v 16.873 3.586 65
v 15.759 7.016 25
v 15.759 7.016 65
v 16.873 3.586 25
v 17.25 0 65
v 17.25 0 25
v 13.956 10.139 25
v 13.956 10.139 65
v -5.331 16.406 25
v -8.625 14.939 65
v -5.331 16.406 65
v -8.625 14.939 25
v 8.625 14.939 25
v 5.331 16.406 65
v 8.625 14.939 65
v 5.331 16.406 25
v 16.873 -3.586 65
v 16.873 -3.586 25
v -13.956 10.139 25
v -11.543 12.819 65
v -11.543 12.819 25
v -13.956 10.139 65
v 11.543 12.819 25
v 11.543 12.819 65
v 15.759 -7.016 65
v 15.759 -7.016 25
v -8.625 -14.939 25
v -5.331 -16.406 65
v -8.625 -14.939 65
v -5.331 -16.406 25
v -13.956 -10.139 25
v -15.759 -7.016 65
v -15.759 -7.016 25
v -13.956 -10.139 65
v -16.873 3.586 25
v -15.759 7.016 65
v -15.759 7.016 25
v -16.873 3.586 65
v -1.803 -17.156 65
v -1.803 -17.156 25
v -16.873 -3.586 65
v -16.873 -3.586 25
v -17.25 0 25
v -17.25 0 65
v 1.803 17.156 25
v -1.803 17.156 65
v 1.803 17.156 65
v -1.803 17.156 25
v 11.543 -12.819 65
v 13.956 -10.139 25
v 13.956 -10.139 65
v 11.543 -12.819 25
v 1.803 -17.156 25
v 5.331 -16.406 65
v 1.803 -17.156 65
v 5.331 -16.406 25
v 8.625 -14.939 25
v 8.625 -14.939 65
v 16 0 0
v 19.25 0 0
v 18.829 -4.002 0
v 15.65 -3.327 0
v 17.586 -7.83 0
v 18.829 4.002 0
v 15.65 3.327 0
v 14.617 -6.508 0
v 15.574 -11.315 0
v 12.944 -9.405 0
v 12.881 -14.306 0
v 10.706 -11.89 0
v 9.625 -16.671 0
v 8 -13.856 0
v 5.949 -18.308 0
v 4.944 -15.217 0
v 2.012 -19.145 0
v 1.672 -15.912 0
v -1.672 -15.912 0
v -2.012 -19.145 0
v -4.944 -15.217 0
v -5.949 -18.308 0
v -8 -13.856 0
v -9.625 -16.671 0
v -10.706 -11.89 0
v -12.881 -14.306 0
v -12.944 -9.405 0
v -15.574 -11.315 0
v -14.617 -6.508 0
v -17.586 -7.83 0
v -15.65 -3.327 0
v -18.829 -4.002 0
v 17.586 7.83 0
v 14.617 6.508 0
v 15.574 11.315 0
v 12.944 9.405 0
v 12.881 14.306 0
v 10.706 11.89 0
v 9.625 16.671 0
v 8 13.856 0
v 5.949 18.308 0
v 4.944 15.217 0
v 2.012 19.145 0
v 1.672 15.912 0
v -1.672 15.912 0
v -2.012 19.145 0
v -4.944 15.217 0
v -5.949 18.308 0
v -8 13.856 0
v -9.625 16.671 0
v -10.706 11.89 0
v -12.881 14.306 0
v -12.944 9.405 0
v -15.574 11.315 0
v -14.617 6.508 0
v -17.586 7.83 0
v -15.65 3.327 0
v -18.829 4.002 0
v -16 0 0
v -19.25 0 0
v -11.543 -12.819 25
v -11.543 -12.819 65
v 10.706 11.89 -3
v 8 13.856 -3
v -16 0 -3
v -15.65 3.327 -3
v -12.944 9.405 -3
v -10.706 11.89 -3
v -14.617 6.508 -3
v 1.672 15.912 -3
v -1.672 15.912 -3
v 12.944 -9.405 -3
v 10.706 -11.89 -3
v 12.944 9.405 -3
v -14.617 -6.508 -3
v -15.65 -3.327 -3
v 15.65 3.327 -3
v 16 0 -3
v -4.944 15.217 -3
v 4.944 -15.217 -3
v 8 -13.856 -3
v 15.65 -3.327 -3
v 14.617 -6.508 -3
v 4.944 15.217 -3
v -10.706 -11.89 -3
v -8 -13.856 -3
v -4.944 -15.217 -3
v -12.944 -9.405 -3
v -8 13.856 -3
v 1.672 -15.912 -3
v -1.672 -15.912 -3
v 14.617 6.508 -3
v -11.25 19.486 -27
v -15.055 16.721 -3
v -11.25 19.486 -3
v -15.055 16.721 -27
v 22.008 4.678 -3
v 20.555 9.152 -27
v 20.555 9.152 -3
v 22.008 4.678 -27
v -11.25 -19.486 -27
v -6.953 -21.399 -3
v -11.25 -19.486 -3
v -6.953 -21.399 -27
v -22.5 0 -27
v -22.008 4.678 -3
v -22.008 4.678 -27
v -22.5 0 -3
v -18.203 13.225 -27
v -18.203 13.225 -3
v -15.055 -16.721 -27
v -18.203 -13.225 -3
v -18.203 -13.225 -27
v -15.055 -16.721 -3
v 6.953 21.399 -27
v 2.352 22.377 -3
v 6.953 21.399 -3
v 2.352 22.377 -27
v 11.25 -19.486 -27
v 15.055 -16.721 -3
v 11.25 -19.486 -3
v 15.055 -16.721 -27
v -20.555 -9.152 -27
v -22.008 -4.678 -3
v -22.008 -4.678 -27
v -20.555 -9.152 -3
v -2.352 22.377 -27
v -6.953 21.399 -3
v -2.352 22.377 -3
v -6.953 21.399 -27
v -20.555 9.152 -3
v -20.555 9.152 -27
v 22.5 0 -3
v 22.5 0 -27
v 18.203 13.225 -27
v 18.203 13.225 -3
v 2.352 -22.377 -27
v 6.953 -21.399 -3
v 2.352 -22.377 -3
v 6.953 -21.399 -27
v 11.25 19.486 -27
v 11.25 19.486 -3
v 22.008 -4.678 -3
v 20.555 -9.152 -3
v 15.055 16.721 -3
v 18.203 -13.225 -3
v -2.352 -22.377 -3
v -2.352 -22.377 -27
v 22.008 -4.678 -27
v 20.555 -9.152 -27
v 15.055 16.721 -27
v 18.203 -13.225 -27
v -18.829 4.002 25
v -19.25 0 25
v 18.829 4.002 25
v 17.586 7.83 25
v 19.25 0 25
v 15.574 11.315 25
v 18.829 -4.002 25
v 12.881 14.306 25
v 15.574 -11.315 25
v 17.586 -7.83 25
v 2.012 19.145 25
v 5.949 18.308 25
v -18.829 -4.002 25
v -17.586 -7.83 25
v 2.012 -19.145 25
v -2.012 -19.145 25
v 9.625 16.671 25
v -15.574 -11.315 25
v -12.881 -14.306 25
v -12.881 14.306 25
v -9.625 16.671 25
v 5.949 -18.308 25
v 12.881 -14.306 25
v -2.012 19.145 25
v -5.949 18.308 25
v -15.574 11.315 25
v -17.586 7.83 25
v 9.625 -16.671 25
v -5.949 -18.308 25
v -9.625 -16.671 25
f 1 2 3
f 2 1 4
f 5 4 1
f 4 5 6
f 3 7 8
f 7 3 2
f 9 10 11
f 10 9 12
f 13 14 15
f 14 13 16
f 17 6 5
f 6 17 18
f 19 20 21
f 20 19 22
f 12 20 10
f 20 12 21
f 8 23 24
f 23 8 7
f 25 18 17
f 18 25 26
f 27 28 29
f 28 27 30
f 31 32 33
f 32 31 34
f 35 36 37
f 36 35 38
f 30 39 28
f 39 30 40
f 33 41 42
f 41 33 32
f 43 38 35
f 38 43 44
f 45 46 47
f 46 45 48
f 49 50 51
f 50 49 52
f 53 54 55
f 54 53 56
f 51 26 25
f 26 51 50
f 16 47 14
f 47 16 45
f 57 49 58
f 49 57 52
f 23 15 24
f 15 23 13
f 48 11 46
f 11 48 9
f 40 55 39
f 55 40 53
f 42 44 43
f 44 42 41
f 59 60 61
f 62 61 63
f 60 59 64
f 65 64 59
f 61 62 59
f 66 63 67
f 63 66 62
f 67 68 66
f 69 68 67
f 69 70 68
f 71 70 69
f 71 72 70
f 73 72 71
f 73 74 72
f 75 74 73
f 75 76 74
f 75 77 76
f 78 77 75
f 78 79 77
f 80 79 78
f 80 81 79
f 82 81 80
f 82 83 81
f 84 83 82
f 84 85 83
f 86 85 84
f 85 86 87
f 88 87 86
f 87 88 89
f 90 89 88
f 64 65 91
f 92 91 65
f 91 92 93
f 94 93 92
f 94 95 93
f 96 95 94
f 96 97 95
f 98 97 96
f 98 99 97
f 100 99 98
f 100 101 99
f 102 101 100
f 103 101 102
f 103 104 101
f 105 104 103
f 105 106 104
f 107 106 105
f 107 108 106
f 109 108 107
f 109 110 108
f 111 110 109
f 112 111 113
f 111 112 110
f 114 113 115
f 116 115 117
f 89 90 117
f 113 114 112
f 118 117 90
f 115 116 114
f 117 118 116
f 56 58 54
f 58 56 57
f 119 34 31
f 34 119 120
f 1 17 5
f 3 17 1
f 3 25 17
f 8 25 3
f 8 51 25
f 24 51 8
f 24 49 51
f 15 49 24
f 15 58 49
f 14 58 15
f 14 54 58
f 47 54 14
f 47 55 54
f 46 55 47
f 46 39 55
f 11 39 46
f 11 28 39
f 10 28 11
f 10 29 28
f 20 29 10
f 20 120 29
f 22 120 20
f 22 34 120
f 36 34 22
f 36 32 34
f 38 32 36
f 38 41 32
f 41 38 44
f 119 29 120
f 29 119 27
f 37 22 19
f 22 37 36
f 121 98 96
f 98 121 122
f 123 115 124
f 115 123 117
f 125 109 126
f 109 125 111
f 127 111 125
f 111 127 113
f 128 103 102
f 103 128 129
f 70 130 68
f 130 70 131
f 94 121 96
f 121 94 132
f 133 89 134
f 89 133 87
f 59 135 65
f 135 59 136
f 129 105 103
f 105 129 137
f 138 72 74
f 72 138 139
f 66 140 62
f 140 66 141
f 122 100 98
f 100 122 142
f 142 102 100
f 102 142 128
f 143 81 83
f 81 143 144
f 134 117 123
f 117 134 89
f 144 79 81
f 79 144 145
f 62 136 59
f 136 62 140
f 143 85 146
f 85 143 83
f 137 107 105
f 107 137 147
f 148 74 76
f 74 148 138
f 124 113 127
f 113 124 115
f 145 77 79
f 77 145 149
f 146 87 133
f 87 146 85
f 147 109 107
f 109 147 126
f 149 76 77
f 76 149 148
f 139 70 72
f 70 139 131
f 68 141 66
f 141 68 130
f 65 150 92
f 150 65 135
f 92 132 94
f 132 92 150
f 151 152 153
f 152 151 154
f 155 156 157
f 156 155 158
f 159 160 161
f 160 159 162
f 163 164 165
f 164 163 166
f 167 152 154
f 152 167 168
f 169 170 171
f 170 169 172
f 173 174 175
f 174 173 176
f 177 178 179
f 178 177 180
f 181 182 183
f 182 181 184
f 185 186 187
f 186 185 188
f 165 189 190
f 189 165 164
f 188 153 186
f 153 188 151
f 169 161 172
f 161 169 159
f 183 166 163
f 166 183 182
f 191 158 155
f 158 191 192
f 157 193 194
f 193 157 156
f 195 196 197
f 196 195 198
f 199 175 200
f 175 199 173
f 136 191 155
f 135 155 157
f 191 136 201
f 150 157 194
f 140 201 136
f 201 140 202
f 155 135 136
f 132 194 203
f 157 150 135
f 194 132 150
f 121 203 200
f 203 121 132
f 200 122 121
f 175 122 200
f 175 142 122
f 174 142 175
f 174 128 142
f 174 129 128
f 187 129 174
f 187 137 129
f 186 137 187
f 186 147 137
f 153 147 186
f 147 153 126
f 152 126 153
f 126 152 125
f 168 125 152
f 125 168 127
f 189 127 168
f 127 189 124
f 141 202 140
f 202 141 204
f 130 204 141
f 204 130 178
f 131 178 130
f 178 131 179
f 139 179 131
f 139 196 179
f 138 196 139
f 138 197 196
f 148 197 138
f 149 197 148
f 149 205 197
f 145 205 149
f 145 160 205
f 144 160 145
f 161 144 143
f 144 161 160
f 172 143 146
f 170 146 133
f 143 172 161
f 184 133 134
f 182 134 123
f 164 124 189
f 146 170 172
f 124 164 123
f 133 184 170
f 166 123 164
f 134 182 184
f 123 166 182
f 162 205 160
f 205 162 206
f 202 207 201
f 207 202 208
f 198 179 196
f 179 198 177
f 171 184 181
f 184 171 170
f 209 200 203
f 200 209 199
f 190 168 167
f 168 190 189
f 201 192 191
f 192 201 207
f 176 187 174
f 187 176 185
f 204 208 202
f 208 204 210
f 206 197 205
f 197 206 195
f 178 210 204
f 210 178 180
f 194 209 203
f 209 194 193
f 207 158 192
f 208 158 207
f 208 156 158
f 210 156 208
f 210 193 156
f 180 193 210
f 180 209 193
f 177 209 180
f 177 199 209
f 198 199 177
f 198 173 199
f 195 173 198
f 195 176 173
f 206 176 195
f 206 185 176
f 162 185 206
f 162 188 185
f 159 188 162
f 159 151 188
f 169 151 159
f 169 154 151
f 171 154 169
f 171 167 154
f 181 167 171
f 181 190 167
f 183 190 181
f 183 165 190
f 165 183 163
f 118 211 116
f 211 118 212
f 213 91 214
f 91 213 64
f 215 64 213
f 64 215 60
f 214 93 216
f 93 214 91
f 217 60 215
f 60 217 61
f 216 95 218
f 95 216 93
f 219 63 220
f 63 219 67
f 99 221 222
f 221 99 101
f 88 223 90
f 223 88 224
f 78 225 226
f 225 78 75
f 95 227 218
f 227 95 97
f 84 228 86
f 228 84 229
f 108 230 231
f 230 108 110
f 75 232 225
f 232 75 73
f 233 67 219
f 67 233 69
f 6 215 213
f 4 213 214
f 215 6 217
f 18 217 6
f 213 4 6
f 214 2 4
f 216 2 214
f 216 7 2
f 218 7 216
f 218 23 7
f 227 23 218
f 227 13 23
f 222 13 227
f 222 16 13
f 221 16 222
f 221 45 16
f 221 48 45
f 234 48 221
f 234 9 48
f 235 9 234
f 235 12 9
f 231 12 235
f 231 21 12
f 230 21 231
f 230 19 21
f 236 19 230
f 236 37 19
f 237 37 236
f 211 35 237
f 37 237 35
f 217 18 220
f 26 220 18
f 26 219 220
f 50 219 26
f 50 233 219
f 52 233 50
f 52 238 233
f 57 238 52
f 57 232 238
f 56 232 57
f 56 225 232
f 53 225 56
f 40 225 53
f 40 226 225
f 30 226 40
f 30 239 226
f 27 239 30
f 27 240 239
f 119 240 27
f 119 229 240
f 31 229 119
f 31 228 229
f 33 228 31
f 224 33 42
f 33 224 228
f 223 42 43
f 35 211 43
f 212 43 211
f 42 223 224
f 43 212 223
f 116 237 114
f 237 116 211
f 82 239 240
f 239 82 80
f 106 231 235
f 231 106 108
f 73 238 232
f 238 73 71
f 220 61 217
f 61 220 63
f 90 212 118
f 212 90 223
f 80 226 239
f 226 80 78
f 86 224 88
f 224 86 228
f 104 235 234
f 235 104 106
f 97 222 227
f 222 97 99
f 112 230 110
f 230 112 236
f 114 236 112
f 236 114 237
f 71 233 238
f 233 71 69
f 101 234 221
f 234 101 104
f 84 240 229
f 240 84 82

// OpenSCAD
module dshaft(d = 6, dee = 0.7, h = 5.8){
    difference() {
    cylinder(r=d/2, h=h, center=true);
        translate([d + d/2 - dee,0,0])
        cube([d*2,d*2,h*2], center=true);
    }
}

module gmshaft_disp() {
    translate([8,0,0]) children();
}
module 12vmotor(neg = false) {
    
cylinder(r=38.5/2,h=25);
cylinder(r=34.5/2,h=53);
cylinder(r=11/2,h=56.5);
translate([10,0,55])    
    cube ([1,3,10], center=true);
translate([-10,0,55])    
    cube ([1,3,10], center=true);
if (neg) {
    cylinder(r=34.5/2,h=65);
    translate([0,0,1])
    rotate(180,[0,1,0])
            cylinder(r=32/2,h=12);
    
    translate([0,0,-3])
    rotate(180,[0,1,0])
            cylinder(r=45/2,h=24);

}
gmshaft_disp()
rotate(180,[0,1,0])
union() {
    cylinder(r=12/2,h=6);
    //cylinder(r=6/2,h=15);
translate([0,0,15/2])
        dshaft(h=15);
}
}

12vmotor(neg = true);
